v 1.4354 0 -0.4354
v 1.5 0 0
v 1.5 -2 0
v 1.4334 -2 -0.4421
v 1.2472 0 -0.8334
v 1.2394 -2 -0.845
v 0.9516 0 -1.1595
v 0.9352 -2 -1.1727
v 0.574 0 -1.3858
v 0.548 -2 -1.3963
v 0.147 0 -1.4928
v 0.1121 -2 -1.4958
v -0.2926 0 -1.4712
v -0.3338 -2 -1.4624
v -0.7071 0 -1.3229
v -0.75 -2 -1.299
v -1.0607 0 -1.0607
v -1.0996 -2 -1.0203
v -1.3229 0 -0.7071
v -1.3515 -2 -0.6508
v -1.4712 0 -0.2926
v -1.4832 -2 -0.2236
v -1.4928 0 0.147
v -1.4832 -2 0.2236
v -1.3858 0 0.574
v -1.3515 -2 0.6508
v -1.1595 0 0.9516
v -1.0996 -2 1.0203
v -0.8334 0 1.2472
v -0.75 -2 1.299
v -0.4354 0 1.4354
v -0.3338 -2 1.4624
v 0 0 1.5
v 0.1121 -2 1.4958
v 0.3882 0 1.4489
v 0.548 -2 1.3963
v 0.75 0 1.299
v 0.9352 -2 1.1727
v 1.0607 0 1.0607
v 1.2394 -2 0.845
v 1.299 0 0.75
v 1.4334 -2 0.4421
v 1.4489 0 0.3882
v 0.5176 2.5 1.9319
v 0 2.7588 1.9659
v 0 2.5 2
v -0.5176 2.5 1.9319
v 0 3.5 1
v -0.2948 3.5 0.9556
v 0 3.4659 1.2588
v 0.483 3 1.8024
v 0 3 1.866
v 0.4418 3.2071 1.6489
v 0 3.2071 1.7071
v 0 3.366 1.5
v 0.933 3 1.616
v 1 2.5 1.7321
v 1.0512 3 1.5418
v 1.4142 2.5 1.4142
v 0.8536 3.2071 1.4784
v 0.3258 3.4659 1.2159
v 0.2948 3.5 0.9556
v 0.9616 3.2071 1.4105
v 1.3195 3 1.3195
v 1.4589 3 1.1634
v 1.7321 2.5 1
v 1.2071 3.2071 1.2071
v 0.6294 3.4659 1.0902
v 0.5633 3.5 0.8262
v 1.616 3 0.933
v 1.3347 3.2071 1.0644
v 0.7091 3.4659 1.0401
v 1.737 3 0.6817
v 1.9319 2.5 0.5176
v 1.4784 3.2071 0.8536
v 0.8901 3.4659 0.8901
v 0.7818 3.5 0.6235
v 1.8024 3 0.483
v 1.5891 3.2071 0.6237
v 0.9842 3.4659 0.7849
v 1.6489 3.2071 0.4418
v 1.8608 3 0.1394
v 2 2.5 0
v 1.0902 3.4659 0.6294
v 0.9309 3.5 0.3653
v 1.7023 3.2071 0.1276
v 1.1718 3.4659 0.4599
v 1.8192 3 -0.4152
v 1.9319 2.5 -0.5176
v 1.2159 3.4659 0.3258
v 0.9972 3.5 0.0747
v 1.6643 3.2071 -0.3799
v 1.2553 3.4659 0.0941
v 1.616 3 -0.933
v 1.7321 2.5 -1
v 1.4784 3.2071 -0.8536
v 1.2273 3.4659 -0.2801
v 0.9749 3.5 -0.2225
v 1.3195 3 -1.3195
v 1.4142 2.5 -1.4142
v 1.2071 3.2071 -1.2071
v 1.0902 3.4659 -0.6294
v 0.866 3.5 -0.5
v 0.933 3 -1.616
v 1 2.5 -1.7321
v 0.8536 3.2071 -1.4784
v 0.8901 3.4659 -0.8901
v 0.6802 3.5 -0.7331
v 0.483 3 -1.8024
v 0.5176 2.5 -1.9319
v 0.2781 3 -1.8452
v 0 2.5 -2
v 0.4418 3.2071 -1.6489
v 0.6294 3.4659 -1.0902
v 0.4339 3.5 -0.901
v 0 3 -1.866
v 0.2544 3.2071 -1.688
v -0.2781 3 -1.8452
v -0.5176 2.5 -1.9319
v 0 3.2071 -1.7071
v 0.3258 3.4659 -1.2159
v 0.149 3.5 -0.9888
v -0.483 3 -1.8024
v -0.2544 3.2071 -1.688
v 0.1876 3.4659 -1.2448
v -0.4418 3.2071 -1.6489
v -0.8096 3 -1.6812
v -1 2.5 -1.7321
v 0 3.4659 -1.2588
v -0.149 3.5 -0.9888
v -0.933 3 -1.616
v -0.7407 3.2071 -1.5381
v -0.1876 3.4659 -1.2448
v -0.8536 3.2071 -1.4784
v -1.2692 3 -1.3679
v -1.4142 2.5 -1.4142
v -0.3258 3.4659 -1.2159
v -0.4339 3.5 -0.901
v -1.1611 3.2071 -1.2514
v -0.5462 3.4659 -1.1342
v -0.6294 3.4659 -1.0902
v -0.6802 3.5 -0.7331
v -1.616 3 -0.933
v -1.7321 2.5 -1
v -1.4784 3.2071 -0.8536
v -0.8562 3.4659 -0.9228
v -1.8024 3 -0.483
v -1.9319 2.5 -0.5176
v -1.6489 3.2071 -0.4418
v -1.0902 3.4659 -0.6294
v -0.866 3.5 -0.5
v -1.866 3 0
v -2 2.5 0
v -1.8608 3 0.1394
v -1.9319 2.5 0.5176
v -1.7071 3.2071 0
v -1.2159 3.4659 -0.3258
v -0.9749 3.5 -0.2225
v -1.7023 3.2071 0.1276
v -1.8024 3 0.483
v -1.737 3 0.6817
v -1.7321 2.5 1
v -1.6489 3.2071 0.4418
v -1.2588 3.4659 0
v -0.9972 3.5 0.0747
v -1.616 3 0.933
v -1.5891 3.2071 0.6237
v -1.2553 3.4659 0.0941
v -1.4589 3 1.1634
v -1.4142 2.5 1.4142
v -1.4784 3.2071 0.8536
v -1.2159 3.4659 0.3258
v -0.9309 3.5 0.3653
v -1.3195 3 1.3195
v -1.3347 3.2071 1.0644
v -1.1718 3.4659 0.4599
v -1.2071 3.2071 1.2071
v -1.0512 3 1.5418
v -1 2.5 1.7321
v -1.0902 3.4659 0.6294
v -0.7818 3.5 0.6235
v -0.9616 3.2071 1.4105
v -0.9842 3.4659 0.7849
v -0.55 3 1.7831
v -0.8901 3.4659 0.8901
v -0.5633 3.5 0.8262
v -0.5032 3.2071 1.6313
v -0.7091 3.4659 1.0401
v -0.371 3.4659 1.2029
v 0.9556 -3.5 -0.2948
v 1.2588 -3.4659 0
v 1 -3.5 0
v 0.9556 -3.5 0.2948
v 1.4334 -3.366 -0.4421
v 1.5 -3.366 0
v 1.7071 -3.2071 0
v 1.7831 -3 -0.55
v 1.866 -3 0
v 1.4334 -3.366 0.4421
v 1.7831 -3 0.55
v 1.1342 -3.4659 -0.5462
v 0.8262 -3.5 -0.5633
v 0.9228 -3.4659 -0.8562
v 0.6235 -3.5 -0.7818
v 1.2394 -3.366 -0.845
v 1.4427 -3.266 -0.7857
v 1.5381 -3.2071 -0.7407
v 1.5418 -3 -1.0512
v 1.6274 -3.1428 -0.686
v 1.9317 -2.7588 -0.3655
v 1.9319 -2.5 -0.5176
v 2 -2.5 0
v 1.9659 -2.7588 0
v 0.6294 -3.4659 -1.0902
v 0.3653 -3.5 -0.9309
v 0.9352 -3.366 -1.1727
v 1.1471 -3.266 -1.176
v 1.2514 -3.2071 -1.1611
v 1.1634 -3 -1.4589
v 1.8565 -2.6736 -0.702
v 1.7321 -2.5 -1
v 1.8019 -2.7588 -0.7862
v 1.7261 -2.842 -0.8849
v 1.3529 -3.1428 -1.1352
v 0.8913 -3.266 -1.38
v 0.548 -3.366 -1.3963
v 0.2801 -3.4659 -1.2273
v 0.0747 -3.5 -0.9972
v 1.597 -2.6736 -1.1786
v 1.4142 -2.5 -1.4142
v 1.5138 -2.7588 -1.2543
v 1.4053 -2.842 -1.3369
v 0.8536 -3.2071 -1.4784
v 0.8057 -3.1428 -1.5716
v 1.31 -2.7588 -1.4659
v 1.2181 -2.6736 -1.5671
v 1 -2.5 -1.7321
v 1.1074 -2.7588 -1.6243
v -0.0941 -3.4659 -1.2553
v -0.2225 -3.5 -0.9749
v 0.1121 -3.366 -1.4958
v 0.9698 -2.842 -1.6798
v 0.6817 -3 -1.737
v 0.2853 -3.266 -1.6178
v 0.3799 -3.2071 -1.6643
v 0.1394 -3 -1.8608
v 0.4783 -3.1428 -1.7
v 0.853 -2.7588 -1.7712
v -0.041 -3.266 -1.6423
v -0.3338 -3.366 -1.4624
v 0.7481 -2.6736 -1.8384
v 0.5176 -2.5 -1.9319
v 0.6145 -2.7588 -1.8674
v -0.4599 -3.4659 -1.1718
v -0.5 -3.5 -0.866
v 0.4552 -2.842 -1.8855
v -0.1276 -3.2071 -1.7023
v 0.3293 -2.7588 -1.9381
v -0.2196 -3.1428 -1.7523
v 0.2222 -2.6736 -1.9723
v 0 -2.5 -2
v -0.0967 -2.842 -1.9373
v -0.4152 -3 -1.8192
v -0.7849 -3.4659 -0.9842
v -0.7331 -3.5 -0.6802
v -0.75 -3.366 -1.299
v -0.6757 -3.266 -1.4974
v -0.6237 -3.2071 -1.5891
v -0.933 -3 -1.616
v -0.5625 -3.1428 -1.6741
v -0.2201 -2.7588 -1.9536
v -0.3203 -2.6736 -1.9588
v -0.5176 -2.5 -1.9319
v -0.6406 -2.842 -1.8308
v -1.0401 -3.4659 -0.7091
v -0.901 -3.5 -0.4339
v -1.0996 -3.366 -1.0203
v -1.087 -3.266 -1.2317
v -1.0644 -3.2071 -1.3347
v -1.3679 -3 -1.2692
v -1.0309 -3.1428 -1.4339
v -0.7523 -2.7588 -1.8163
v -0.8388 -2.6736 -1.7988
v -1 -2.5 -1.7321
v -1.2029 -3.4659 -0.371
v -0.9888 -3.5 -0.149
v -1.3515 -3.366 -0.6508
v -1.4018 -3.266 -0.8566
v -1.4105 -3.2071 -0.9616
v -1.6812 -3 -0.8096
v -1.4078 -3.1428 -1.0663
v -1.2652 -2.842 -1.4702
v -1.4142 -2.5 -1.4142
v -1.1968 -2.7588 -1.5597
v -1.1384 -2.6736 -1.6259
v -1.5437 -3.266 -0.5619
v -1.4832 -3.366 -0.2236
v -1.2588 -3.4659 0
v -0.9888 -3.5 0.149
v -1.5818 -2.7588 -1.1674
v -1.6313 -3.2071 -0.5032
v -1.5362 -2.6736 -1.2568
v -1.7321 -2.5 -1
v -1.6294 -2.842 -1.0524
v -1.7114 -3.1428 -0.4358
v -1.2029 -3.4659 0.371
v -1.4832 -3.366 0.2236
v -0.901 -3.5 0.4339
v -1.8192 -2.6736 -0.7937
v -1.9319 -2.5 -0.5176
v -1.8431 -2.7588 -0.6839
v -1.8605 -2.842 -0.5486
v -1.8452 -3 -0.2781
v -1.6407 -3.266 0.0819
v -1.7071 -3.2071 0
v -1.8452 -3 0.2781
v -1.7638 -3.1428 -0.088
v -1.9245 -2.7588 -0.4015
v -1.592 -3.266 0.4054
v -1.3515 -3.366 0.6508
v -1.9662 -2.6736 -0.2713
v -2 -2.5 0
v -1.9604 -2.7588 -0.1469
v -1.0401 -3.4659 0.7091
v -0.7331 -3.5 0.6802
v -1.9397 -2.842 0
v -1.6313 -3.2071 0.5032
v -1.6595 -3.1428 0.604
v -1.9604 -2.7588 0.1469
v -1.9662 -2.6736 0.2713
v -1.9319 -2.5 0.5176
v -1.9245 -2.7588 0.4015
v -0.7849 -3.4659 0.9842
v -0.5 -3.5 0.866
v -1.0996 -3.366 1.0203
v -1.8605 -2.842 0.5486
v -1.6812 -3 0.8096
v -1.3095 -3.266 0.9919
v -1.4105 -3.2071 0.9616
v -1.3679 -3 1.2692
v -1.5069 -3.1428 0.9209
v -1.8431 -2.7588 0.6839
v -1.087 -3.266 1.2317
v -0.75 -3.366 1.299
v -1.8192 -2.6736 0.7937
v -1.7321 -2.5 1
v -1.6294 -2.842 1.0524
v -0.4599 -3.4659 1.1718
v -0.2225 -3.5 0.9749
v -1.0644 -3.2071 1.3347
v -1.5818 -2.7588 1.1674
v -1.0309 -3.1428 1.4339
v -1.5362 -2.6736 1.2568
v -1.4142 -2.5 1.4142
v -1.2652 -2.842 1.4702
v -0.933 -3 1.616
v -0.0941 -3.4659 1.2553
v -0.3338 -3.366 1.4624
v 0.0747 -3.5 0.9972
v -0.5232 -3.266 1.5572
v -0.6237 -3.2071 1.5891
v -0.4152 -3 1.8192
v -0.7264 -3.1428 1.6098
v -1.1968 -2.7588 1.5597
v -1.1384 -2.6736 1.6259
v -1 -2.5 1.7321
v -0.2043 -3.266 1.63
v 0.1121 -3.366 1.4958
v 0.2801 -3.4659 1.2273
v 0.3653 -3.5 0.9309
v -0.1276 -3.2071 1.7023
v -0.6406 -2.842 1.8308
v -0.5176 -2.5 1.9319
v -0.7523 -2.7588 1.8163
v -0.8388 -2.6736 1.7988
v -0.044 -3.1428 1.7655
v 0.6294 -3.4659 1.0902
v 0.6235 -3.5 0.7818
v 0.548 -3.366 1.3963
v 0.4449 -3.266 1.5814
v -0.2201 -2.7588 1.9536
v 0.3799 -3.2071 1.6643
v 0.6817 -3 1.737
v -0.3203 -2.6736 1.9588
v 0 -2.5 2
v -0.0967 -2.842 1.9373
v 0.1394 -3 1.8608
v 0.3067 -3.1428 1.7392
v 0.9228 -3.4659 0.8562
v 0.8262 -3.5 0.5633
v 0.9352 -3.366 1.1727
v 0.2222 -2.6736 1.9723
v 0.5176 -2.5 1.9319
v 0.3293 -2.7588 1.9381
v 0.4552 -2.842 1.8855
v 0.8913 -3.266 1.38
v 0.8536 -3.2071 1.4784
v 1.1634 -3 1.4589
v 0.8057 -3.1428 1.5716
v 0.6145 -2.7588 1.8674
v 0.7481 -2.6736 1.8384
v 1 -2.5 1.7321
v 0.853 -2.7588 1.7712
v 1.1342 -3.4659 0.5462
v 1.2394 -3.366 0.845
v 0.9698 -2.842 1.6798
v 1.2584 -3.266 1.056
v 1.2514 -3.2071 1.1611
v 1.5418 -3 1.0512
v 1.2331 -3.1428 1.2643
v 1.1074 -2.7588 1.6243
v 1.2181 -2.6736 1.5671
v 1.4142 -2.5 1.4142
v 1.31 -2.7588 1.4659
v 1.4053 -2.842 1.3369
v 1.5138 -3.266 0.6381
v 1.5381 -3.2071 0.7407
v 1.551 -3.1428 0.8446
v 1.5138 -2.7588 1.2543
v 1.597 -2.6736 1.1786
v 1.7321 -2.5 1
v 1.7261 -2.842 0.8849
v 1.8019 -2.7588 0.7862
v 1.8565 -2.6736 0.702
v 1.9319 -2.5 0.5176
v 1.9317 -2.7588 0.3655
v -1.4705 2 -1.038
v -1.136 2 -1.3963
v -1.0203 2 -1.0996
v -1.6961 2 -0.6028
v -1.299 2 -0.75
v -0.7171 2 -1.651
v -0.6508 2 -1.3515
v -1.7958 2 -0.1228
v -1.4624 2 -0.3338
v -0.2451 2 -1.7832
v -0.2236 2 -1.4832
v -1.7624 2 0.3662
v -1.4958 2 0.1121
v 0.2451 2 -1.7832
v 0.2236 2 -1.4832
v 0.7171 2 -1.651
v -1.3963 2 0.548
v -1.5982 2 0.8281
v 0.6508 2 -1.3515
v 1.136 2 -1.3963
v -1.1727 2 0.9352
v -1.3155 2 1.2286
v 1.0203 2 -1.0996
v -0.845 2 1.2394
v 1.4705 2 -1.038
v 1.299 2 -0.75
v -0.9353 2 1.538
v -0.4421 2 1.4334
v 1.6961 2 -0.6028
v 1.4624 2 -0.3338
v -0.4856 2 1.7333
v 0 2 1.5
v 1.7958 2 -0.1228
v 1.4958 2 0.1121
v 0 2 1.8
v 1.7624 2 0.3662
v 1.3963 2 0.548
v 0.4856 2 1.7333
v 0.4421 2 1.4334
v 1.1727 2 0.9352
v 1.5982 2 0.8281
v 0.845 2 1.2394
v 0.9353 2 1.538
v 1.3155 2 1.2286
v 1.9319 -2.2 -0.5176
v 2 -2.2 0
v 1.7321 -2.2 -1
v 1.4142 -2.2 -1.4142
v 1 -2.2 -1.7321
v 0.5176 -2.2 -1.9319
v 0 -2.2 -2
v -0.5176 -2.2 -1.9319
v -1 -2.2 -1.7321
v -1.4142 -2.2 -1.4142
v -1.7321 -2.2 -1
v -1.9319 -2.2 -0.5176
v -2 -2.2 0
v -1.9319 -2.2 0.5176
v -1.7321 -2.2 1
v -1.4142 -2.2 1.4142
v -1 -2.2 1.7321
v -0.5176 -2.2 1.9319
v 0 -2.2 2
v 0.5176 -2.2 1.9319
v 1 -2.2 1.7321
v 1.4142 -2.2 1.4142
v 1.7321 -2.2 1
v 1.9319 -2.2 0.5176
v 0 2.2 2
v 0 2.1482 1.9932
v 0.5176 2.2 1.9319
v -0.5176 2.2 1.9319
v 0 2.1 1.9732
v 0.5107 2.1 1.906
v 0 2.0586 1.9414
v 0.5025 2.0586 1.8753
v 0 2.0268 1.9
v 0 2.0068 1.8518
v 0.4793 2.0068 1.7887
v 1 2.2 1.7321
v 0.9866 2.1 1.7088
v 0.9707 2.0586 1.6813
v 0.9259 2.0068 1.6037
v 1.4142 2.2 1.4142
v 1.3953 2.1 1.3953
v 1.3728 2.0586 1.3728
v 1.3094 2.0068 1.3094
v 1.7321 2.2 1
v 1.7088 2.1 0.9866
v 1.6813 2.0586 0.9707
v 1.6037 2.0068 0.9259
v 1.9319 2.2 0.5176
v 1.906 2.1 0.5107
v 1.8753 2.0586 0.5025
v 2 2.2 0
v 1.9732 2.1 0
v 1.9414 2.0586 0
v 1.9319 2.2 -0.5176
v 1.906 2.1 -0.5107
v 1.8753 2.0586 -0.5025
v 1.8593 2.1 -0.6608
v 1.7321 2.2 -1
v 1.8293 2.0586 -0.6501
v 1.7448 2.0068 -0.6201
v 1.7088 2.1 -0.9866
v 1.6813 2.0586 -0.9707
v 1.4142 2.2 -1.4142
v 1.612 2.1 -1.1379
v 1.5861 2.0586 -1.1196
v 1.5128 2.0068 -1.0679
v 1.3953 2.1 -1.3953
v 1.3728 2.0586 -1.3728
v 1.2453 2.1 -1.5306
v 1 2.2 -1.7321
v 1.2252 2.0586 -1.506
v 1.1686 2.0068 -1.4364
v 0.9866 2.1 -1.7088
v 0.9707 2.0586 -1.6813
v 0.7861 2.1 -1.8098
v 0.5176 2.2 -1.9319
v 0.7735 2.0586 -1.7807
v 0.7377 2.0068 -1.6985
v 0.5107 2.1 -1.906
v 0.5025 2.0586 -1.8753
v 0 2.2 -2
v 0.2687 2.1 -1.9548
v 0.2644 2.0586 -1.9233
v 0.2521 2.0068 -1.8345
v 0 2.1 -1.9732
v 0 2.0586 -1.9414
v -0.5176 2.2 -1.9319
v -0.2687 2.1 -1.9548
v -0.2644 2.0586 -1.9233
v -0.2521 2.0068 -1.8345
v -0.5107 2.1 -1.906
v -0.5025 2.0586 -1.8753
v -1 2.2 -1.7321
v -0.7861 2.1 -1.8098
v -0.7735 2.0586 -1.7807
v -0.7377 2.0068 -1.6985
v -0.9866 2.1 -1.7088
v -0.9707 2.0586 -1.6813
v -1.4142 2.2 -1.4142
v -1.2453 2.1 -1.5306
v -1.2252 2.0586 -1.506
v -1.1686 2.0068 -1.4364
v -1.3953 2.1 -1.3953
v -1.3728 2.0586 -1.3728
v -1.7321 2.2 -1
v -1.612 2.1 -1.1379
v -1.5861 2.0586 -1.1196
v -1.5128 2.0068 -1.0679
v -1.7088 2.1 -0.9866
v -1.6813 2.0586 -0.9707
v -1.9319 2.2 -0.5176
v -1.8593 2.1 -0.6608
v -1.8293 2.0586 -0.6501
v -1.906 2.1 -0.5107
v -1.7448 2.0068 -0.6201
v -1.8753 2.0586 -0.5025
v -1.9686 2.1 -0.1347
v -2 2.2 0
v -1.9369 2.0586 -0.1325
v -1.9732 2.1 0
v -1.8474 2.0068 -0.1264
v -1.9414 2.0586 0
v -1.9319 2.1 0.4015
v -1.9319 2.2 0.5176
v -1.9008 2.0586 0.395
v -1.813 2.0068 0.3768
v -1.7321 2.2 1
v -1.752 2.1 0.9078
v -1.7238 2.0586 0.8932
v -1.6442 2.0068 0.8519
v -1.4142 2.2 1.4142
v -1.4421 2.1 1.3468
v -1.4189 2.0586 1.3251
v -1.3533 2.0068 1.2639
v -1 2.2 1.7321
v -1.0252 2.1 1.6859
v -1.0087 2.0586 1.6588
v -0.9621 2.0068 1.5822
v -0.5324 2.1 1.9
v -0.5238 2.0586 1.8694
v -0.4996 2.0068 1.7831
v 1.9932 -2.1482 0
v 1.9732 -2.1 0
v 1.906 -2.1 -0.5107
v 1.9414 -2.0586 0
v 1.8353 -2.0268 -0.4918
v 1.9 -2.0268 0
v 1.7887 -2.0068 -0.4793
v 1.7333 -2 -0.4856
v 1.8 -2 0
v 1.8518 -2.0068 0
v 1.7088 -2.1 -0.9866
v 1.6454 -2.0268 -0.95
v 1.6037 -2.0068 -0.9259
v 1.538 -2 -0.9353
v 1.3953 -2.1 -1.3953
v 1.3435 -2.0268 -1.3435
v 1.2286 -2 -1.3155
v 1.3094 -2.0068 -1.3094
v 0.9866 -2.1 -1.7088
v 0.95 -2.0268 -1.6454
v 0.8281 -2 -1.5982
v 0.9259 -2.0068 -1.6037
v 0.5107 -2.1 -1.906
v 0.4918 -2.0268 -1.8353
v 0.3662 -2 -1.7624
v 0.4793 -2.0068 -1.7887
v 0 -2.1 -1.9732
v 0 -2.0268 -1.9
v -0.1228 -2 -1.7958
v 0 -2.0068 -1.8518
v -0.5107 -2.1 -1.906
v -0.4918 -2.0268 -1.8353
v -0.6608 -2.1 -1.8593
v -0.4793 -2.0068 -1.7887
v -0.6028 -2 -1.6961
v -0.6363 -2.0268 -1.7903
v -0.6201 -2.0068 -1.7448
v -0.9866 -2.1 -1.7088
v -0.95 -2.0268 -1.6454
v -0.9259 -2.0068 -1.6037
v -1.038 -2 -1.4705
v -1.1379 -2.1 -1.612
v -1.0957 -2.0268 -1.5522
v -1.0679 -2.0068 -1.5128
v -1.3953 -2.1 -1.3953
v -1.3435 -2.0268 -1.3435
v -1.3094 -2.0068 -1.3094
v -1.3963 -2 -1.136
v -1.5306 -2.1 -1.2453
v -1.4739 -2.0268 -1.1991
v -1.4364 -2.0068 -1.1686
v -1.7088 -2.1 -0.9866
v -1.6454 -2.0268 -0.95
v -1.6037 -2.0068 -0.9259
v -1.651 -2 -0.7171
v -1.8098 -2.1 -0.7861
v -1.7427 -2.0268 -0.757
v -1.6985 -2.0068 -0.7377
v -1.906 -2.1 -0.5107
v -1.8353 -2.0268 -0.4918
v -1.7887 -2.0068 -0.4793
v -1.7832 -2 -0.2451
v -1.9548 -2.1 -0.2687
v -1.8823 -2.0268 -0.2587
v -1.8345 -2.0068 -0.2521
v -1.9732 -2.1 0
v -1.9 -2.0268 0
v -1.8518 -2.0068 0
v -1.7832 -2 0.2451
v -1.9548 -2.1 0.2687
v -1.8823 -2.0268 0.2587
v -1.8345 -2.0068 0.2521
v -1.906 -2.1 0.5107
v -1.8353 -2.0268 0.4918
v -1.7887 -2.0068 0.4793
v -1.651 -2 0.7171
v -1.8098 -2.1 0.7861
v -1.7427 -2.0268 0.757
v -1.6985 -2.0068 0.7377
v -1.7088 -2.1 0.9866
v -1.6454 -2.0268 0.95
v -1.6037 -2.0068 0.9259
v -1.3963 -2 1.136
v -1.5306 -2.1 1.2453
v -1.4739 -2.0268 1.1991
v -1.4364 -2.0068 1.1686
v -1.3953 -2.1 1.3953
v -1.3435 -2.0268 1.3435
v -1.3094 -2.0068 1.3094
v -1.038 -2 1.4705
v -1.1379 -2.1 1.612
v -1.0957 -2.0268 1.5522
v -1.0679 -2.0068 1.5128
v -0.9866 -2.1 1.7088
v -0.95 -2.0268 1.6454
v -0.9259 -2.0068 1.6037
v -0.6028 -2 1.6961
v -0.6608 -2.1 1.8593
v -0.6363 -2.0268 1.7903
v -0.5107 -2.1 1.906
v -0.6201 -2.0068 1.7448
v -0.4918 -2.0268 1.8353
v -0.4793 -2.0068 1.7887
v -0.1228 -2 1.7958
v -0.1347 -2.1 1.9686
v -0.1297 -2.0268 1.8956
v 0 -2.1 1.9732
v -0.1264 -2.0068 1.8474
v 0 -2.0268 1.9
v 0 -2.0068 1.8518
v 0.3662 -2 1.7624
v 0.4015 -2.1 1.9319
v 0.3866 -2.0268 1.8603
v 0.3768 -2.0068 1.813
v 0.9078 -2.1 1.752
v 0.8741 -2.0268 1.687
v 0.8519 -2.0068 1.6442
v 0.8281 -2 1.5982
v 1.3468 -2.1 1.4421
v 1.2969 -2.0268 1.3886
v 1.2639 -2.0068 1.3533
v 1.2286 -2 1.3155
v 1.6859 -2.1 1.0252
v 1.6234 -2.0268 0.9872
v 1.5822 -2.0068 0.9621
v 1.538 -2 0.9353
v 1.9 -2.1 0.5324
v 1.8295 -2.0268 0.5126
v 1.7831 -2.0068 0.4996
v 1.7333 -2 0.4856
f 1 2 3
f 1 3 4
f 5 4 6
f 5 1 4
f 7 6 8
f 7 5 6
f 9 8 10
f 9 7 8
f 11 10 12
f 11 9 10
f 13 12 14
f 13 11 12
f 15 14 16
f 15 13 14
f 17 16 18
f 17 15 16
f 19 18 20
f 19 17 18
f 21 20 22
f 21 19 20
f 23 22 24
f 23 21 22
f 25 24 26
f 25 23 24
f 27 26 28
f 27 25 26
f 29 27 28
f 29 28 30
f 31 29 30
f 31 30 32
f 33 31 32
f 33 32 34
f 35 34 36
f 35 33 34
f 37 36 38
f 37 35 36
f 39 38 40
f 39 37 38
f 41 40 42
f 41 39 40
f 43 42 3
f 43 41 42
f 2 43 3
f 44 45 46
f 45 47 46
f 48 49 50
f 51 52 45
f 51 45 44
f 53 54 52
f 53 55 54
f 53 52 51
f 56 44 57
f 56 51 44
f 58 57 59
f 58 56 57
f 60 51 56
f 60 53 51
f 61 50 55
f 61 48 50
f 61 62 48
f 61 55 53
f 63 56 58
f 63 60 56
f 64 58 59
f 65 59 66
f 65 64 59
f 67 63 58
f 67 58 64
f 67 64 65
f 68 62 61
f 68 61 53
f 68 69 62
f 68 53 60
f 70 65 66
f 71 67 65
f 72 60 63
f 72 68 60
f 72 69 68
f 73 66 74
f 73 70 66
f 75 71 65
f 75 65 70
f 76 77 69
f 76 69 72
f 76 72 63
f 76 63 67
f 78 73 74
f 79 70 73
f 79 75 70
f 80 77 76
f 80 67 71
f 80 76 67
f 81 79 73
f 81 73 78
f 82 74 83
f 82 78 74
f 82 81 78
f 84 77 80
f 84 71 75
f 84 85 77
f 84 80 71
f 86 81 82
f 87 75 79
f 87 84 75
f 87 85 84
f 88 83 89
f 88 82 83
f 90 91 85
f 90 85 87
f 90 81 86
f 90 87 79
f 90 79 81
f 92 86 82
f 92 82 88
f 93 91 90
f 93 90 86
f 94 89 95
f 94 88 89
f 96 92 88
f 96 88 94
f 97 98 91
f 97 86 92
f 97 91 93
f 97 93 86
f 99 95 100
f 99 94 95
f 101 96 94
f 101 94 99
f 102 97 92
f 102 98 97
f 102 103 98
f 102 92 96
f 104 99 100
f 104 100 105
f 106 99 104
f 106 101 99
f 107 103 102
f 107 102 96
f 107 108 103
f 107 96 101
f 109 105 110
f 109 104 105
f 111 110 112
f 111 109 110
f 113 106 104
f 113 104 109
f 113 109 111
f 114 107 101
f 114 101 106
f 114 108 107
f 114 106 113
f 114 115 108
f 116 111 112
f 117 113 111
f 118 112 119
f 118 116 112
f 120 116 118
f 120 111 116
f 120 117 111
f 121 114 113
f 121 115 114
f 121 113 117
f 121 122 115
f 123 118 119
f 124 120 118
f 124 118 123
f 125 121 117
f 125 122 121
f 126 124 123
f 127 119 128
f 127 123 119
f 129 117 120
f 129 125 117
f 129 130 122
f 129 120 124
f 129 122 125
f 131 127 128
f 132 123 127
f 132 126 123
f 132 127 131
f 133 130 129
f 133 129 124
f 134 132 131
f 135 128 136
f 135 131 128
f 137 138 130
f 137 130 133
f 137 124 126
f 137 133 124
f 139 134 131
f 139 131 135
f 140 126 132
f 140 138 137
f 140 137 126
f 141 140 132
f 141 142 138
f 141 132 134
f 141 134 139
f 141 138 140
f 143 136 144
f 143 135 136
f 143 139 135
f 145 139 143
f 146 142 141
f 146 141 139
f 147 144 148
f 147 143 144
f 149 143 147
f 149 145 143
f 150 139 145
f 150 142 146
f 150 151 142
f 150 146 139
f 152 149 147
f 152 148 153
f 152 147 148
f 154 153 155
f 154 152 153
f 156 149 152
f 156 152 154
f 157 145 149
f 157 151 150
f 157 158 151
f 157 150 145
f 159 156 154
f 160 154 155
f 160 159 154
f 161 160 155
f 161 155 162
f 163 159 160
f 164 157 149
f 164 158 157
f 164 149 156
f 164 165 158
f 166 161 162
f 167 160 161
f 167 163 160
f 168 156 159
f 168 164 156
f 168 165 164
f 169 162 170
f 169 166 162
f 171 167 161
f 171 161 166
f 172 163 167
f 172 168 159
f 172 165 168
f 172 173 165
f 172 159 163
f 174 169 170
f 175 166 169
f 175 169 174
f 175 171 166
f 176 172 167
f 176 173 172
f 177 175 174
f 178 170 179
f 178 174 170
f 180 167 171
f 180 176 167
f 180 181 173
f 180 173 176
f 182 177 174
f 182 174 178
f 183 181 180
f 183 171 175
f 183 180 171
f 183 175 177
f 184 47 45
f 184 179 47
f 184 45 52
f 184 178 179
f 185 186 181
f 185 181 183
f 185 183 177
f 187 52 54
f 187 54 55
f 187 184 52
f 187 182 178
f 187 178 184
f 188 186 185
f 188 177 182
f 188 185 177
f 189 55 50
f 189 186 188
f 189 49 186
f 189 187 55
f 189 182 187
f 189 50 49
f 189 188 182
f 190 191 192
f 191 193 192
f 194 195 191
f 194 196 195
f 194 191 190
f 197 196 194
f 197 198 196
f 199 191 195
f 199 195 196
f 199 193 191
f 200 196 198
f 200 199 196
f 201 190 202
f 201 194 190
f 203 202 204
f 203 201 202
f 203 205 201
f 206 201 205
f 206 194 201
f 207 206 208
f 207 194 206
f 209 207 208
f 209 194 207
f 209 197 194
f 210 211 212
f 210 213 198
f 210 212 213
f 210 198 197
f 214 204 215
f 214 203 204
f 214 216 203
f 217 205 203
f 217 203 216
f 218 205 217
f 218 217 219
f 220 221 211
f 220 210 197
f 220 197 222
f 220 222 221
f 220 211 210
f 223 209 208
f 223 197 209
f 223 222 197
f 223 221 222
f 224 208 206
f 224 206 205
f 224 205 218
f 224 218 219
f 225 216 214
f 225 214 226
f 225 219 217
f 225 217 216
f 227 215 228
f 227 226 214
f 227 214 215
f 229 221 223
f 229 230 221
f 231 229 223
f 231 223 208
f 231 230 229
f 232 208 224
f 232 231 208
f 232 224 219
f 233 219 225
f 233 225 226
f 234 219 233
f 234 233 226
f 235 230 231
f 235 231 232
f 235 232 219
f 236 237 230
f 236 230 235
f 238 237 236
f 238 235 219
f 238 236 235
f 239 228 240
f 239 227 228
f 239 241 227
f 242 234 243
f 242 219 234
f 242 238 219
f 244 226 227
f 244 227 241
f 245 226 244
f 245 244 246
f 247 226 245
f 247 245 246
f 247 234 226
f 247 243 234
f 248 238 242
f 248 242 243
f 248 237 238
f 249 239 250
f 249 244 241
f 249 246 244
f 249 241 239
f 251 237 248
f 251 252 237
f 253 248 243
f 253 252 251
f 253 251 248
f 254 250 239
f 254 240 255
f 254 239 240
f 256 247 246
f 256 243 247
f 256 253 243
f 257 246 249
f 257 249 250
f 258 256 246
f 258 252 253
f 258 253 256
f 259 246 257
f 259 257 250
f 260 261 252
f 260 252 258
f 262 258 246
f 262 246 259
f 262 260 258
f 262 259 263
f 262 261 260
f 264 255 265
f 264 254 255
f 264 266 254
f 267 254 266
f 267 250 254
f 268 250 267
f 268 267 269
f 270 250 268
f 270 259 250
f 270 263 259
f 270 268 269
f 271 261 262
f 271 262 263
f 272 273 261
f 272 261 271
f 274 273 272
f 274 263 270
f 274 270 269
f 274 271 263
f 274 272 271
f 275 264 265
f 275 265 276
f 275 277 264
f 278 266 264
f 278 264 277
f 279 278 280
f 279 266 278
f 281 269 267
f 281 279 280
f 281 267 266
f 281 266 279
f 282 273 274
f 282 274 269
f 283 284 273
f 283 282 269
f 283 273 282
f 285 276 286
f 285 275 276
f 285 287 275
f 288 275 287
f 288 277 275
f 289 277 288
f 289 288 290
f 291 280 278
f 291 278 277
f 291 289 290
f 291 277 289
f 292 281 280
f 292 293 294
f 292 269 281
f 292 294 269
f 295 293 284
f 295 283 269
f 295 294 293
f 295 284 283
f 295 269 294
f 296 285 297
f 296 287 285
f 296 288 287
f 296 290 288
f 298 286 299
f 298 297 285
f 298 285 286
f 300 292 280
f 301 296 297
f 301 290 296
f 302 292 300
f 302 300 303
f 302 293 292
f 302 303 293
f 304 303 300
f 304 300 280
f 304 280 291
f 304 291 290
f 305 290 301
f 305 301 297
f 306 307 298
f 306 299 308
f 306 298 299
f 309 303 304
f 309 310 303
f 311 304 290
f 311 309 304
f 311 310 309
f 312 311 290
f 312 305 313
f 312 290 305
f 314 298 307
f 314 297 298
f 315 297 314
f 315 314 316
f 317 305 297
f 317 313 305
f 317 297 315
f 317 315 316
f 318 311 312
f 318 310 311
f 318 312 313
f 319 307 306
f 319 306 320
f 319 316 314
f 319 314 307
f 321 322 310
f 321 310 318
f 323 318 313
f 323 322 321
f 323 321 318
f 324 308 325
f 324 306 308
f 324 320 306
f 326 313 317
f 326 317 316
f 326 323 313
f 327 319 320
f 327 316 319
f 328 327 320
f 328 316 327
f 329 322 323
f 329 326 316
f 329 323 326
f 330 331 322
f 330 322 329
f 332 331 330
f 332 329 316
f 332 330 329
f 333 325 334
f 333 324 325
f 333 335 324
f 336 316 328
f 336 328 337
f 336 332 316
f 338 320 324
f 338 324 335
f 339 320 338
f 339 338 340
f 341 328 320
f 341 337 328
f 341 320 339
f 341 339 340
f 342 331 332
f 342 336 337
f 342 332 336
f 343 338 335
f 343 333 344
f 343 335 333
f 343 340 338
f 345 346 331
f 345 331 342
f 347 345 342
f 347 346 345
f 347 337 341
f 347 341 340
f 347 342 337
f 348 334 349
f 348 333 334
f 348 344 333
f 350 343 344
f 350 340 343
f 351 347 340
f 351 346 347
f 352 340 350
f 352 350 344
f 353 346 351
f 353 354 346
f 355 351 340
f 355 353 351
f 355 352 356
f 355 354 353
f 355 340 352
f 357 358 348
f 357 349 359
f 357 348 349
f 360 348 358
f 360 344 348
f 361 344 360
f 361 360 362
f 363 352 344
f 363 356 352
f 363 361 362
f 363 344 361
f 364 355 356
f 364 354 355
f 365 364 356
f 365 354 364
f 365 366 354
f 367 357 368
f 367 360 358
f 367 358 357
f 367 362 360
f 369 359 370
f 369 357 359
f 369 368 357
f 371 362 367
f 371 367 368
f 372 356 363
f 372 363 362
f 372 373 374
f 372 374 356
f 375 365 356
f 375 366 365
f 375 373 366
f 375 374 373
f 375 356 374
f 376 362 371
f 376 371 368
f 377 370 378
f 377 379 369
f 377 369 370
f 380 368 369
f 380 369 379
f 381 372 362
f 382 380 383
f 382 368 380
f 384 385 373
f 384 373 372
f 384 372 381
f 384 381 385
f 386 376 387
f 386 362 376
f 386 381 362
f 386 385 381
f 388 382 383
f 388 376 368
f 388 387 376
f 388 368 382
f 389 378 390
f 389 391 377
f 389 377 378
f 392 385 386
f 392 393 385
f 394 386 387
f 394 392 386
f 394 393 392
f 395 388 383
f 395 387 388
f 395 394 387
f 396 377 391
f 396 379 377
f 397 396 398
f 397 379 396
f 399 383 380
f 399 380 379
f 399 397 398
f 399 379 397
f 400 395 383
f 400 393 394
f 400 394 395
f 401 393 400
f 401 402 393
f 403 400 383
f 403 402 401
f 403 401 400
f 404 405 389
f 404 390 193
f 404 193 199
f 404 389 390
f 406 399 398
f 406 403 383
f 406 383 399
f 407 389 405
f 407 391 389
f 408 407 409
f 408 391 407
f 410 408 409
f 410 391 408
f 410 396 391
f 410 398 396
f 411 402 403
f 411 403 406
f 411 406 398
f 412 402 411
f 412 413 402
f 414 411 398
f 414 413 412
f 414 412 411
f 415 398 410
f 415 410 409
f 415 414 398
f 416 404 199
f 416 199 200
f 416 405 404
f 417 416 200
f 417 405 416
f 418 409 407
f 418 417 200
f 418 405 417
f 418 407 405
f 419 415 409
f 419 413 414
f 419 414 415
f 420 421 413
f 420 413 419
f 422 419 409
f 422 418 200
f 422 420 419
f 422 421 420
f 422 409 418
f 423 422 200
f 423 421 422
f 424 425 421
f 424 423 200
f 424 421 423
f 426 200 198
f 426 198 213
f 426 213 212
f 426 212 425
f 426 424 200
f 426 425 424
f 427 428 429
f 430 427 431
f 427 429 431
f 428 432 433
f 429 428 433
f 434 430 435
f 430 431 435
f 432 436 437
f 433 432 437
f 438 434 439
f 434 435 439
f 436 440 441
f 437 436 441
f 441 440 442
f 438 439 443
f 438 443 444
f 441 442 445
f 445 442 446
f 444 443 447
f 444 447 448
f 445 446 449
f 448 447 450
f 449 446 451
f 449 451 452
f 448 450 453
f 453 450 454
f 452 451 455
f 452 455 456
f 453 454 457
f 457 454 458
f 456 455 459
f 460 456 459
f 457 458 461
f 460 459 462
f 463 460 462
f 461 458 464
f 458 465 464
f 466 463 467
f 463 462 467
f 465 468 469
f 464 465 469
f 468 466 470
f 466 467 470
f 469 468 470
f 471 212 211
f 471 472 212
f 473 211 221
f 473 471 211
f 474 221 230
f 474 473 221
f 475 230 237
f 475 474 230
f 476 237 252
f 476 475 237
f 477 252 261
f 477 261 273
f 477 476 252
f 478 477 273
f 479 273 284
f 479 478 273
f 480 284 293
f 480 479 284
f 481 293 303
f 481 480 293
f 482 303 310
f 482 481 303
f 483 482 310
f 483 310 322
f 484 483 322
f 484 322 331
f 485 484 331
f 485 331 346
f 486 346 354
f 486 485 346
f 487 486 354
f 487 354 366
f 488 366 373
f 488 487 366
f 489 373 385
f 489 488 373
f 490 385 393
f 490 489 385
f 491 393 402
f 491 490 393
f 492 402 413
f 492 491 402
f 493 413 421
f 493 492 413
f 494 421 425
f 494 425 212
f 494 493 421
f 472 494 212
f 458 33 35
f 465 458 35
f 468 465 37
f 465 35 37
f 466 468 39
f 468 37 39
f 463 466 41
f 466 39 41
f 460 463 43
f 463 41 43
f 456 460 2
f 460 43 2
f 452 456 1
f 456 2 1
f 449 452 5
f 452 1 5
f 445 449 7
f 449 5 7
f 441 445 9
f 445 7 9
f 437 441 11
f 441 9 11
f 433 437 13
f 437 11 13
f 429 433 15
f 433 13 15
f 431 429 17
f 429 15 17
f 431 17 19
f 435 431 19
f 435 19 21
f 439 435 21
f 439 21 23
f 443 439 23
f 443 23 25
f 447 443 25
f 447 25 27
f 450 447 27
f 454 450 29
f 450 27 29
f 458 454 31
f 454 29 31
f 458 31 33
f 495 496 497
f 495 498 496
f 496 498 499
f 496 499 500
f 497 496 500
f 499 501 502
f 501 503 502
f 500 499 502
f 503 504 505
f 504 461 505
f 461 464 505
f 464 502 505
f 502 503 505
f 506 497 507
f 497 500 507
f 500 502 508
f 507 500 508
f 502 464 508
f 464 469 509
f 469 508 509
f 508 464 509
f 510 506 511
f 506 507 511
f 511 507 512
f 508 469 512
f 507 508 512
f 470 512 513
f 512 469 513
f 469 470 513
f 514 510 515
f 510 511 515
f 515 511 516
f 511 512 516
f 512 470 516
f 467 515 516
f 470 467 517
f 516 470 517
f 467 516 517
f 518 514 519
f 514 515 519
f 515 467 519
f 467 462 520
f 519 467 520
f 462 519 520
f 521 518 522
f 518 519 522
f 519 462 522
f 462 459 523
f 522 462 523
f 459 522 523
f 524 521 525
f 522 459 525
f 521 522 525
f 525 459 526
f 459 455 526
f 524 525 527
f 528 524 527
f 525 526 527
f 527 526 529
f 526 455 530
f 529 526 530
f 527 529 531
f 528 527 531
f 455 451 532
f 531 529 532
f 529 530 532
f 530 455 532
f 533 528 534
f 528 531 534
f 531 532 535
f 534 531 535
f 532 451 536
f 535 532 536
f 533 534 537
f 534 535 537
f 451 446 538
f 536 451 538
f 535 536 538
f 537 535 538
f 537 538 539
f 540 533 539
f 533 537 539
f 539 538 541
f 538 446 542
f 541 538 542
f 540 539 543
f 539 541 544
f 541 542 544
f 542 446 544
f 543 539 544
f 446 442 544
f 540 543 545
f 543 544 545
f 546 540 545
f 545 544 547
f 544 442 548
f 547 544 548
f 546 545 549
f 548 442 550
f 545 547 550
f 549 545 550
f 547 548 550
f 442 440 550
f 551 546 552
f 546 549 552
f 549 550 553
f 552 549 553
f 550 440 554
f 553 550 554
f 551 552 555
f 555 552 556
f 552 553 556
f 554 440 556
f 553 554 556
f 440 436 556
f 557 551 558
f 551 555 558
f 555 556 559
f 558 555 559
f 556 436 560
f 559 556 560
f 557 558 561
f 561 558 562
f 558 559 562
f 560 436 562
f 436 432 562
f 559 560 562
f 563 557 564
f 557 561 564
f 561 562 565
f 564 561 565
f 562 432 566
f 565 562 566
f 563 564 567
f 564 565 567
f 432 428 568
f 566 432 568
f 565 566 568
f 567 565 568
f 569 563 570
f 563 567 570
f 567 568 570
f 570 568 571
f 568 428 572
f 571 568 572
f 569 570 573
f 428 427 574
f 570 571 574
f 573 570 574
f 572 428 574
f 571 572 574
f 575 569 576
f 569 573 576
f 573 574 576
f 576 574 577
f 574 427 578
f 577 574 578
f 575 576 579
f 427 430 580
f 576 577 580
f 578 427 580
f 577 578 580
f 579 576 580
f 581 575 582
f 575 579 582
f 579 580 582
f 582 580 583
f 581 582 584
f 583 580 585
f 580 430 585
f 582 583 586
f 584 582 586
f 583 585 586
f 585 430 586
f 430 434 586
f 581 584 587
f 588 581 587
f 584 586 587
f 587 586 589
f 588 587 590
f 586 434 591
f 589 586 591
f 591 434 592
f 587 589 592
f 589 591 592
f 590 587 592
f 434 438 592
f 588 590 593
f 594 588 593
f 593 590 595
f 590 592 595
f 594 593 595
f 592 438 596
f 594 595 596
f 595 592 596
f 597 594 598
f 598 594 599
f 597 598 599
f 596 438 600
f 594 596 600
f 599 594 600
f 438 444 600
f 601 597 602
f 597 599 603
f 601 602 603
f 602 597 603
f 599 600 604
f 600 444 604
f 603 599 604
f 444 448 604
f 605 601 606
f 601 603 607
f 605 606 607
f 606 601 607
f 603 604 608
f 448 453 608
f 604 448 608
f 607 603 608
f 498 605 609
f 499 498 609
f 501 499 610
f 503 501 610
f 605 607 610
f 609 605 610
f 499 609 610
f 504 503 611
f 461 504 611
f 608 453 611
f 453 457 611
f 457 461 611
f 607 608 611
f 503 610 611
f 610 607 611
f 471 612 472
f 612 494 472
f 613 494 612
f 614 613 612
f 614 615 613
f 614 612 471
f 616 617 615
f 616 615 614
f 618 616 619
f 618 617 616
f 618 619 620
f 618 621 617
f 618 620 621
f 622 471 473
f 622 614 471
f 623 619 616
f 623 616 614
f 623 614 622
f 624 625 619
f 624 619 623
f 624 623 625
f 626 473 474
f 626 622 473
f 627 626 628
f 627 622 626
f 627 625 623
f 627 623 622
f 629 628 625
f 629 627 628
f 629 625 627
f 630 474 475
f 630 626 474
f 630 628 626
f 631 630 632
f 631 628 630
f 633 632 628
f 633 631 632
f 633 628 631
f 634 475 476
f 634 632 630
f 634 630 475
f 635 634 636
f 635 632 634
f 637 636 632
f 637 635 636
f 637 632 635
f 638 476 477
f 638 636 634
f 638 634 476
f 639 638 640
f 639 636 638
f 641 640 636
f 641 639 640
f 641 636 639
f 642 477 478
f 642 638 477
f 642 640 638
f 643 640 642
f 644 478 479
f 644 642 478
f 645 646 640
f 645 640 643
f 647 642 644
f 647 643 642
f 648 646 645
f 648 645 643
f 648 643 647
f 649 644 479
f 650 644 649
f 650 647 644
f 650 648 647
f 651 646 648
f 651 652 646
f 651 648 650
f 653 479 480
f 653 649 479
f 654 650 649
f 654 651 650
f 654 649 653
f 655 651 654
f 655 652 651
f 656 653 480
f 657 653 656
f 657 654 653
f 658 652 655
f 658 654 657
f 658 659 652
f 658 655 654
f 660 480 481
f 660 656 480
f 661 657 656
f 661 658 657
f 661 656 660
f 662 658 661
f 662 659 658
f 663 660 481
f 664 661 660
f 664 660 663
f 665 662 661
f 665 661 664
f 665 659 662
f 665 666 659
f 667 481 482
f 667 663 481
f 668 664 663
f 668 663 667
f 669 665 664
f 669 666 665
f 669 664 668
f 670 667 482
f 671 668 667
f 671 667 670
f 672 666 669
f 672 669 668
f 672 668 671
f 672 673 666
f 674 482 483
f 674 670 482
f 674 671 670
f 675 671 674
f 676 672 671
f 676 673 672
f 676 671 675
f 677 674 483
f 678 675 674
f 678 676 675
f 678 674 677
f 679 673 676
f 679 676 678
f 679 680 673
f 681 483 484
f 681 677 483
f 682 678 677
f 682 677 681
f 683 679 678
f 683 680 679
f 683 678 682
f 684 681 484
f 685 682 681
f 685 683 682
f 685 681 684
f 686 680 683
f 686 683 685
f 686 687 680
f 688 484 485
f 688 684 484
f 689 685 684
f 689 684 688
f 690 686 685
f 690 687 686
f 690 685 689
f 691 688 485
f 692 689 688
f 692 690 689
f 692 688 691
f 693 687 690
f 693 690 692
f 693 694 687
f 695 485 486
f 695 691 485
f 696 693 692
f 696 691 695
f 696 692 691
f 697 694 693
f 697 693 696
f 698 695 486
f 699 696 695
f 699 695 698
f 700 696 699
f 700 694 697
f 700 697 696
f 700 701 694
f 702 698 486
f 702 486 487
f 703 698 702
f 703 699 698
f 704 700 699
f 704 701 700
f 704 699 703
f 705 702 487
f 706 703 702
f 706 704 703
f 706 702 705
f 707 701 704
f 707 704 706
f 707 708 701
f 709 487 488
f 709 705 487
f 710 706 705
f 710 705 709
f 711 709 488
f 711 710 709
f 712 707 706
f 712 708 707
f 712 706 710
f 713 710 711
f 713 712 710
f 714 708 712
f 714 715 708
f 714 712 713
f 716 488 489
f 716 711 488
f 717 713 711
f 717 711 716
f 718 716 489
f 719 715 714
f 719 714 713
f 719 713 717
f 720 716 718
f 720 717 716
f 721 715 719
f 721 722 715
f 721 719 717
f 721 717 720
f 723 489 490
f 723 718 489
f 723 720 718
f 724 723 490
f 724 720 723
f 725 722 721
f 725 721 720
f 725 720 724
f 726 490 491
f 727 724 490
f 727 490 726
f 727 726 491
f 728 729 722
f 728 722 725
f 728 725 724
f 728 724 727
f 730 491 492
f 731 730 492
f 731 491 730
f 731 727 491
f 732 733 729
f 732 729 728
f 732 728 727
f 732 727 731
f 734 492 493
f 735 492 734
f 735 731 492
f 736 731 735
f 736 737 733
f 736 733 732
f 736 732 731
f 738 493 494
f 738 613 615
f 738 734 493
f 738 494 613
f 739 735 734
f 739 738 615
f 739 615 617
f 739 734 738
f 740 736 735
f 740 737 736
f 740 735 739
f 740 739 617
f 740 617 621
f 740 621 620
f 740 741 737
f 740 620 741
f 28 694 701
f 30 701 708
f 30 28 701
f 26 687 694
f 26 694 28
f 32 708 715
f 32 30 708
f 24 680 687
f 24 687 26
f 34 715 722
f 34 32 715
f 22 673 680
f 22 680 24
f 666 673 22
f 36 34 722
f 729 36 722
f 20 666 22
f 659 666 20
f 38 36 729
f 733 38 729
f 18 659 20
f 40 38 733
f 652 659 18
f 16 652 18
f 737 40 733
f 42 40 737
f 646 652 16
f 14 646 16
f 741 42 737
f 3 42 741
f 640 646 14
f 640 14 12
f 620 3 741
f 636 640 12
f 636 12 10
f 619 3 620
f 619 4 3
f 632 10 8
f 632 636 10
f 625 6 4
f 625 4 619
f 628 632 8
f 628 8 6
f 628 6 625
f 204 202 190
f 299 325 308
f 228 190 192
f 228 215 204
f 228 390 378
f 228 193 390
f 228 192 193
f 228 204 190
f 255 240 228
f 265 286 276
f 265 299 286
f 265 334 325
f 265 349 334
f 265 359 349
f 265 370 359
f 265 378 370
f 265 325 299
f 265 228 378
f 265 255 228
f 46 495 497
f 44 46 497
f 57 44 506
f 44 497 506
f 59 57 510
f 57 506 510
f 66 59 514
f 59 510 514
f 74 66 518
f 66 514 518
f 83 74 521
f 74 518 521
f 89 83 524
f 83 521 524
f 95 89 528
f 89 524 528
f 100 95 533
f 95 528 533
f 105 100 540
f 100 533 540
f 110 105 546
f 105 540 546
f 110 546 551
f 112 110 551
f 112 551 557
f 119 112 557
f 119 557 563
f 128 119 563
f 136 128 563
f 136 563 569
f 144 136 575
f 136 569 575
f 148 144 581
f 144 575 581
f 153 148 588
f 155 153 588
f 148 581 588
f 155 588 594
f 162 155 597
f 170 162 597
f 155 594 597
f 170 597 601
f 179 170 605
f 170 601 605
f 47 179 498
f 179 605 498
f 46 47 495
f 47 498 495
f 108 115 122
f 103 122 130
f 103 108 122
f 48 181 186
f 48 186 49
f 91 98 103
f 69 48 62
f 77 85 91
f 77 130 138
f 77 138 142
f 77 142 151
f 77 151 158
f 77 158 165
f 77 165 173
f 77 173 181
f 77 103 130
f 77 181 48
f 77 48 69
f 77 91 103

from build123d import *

# Parameters (mm, degrees)
SKETCH1_R            = 1.5
BOSS_EXTRUDE1_DEPTH  = 2
SKETCH2_R            = 2
BOSS_EXTRUDE2_DEPTH  = 1.5
FILLET1_R            = 1
FILLET2_R            = 0.2
FILLET1_OF_MIRROR2_R = 1
FILLET2_OF_MIRROR2_R = 0.2


with BuildPart() as part:
    # Sketch1 → Boss-Extrude1 (new body)
    with BuildSketch(Plane(origin=(0, 0, 0), x_dir=(1, 0, 0), z_dir=(0, 1, 0))):
        Circle(SKETCH1_R)
    boss_extrude1 = extrude(amount=BOSS_EXTRUDE1_DEPTH)

    # Sketch2 → Boss-Extrude2 (add)
    with BuildSketch(Plane(origin=(0, 2, 0), x_dir=(1, 0, 0), z_dir=(0, 1, 0))):
        Circle(SKETCH2_R)
    boss_extrude2 = extrude(amount=BOSS_EXTRUDE2_DEPTH)

    # Fillet1
    fillet1_edges = [part.edges().sort_by_distance(p)[0] for p in [
        (-2, 3.5, 0),
    ]]
    fillet(fillet1_edges, radius=FILLET1_R)

    # Fillet2
    fillet2_edges = [part.edges().sort_by_distance(p)[0] for p in [
        (-2, 2, 0),
    ]]
    fillet(fillet2_edges, radius=FILLET2_R)

    # Mirror2: Boss-Extrude1, Boss-Extrude2 across plane
    add(boss_extrude1.mirror(Plane.ZX))
    add(boss_extrude2.mirror(Plane.ZX))

    # Fillet1 of Mirror2
    fillet1_of_mirror2_edges = [part.edges().sort_by_distance(p)[0] for p in [
        (-2, -3.5, 0),
    ]]
    fillet(fillet1_of_mirror2_edges, radius=FILLET1_OF_MIRROR2_R)

    # Fillet2 of Mirror2
    fillet2_of_mirror2_edges = [part.edges().sort_by_distance(p)[0] for p in [
        (-2, -2, 0),
    ]]
    fillet(fillet2_of_mirror2_edges, radius=FILLET2_OF_MIRROR2_R)


solid = part.part
